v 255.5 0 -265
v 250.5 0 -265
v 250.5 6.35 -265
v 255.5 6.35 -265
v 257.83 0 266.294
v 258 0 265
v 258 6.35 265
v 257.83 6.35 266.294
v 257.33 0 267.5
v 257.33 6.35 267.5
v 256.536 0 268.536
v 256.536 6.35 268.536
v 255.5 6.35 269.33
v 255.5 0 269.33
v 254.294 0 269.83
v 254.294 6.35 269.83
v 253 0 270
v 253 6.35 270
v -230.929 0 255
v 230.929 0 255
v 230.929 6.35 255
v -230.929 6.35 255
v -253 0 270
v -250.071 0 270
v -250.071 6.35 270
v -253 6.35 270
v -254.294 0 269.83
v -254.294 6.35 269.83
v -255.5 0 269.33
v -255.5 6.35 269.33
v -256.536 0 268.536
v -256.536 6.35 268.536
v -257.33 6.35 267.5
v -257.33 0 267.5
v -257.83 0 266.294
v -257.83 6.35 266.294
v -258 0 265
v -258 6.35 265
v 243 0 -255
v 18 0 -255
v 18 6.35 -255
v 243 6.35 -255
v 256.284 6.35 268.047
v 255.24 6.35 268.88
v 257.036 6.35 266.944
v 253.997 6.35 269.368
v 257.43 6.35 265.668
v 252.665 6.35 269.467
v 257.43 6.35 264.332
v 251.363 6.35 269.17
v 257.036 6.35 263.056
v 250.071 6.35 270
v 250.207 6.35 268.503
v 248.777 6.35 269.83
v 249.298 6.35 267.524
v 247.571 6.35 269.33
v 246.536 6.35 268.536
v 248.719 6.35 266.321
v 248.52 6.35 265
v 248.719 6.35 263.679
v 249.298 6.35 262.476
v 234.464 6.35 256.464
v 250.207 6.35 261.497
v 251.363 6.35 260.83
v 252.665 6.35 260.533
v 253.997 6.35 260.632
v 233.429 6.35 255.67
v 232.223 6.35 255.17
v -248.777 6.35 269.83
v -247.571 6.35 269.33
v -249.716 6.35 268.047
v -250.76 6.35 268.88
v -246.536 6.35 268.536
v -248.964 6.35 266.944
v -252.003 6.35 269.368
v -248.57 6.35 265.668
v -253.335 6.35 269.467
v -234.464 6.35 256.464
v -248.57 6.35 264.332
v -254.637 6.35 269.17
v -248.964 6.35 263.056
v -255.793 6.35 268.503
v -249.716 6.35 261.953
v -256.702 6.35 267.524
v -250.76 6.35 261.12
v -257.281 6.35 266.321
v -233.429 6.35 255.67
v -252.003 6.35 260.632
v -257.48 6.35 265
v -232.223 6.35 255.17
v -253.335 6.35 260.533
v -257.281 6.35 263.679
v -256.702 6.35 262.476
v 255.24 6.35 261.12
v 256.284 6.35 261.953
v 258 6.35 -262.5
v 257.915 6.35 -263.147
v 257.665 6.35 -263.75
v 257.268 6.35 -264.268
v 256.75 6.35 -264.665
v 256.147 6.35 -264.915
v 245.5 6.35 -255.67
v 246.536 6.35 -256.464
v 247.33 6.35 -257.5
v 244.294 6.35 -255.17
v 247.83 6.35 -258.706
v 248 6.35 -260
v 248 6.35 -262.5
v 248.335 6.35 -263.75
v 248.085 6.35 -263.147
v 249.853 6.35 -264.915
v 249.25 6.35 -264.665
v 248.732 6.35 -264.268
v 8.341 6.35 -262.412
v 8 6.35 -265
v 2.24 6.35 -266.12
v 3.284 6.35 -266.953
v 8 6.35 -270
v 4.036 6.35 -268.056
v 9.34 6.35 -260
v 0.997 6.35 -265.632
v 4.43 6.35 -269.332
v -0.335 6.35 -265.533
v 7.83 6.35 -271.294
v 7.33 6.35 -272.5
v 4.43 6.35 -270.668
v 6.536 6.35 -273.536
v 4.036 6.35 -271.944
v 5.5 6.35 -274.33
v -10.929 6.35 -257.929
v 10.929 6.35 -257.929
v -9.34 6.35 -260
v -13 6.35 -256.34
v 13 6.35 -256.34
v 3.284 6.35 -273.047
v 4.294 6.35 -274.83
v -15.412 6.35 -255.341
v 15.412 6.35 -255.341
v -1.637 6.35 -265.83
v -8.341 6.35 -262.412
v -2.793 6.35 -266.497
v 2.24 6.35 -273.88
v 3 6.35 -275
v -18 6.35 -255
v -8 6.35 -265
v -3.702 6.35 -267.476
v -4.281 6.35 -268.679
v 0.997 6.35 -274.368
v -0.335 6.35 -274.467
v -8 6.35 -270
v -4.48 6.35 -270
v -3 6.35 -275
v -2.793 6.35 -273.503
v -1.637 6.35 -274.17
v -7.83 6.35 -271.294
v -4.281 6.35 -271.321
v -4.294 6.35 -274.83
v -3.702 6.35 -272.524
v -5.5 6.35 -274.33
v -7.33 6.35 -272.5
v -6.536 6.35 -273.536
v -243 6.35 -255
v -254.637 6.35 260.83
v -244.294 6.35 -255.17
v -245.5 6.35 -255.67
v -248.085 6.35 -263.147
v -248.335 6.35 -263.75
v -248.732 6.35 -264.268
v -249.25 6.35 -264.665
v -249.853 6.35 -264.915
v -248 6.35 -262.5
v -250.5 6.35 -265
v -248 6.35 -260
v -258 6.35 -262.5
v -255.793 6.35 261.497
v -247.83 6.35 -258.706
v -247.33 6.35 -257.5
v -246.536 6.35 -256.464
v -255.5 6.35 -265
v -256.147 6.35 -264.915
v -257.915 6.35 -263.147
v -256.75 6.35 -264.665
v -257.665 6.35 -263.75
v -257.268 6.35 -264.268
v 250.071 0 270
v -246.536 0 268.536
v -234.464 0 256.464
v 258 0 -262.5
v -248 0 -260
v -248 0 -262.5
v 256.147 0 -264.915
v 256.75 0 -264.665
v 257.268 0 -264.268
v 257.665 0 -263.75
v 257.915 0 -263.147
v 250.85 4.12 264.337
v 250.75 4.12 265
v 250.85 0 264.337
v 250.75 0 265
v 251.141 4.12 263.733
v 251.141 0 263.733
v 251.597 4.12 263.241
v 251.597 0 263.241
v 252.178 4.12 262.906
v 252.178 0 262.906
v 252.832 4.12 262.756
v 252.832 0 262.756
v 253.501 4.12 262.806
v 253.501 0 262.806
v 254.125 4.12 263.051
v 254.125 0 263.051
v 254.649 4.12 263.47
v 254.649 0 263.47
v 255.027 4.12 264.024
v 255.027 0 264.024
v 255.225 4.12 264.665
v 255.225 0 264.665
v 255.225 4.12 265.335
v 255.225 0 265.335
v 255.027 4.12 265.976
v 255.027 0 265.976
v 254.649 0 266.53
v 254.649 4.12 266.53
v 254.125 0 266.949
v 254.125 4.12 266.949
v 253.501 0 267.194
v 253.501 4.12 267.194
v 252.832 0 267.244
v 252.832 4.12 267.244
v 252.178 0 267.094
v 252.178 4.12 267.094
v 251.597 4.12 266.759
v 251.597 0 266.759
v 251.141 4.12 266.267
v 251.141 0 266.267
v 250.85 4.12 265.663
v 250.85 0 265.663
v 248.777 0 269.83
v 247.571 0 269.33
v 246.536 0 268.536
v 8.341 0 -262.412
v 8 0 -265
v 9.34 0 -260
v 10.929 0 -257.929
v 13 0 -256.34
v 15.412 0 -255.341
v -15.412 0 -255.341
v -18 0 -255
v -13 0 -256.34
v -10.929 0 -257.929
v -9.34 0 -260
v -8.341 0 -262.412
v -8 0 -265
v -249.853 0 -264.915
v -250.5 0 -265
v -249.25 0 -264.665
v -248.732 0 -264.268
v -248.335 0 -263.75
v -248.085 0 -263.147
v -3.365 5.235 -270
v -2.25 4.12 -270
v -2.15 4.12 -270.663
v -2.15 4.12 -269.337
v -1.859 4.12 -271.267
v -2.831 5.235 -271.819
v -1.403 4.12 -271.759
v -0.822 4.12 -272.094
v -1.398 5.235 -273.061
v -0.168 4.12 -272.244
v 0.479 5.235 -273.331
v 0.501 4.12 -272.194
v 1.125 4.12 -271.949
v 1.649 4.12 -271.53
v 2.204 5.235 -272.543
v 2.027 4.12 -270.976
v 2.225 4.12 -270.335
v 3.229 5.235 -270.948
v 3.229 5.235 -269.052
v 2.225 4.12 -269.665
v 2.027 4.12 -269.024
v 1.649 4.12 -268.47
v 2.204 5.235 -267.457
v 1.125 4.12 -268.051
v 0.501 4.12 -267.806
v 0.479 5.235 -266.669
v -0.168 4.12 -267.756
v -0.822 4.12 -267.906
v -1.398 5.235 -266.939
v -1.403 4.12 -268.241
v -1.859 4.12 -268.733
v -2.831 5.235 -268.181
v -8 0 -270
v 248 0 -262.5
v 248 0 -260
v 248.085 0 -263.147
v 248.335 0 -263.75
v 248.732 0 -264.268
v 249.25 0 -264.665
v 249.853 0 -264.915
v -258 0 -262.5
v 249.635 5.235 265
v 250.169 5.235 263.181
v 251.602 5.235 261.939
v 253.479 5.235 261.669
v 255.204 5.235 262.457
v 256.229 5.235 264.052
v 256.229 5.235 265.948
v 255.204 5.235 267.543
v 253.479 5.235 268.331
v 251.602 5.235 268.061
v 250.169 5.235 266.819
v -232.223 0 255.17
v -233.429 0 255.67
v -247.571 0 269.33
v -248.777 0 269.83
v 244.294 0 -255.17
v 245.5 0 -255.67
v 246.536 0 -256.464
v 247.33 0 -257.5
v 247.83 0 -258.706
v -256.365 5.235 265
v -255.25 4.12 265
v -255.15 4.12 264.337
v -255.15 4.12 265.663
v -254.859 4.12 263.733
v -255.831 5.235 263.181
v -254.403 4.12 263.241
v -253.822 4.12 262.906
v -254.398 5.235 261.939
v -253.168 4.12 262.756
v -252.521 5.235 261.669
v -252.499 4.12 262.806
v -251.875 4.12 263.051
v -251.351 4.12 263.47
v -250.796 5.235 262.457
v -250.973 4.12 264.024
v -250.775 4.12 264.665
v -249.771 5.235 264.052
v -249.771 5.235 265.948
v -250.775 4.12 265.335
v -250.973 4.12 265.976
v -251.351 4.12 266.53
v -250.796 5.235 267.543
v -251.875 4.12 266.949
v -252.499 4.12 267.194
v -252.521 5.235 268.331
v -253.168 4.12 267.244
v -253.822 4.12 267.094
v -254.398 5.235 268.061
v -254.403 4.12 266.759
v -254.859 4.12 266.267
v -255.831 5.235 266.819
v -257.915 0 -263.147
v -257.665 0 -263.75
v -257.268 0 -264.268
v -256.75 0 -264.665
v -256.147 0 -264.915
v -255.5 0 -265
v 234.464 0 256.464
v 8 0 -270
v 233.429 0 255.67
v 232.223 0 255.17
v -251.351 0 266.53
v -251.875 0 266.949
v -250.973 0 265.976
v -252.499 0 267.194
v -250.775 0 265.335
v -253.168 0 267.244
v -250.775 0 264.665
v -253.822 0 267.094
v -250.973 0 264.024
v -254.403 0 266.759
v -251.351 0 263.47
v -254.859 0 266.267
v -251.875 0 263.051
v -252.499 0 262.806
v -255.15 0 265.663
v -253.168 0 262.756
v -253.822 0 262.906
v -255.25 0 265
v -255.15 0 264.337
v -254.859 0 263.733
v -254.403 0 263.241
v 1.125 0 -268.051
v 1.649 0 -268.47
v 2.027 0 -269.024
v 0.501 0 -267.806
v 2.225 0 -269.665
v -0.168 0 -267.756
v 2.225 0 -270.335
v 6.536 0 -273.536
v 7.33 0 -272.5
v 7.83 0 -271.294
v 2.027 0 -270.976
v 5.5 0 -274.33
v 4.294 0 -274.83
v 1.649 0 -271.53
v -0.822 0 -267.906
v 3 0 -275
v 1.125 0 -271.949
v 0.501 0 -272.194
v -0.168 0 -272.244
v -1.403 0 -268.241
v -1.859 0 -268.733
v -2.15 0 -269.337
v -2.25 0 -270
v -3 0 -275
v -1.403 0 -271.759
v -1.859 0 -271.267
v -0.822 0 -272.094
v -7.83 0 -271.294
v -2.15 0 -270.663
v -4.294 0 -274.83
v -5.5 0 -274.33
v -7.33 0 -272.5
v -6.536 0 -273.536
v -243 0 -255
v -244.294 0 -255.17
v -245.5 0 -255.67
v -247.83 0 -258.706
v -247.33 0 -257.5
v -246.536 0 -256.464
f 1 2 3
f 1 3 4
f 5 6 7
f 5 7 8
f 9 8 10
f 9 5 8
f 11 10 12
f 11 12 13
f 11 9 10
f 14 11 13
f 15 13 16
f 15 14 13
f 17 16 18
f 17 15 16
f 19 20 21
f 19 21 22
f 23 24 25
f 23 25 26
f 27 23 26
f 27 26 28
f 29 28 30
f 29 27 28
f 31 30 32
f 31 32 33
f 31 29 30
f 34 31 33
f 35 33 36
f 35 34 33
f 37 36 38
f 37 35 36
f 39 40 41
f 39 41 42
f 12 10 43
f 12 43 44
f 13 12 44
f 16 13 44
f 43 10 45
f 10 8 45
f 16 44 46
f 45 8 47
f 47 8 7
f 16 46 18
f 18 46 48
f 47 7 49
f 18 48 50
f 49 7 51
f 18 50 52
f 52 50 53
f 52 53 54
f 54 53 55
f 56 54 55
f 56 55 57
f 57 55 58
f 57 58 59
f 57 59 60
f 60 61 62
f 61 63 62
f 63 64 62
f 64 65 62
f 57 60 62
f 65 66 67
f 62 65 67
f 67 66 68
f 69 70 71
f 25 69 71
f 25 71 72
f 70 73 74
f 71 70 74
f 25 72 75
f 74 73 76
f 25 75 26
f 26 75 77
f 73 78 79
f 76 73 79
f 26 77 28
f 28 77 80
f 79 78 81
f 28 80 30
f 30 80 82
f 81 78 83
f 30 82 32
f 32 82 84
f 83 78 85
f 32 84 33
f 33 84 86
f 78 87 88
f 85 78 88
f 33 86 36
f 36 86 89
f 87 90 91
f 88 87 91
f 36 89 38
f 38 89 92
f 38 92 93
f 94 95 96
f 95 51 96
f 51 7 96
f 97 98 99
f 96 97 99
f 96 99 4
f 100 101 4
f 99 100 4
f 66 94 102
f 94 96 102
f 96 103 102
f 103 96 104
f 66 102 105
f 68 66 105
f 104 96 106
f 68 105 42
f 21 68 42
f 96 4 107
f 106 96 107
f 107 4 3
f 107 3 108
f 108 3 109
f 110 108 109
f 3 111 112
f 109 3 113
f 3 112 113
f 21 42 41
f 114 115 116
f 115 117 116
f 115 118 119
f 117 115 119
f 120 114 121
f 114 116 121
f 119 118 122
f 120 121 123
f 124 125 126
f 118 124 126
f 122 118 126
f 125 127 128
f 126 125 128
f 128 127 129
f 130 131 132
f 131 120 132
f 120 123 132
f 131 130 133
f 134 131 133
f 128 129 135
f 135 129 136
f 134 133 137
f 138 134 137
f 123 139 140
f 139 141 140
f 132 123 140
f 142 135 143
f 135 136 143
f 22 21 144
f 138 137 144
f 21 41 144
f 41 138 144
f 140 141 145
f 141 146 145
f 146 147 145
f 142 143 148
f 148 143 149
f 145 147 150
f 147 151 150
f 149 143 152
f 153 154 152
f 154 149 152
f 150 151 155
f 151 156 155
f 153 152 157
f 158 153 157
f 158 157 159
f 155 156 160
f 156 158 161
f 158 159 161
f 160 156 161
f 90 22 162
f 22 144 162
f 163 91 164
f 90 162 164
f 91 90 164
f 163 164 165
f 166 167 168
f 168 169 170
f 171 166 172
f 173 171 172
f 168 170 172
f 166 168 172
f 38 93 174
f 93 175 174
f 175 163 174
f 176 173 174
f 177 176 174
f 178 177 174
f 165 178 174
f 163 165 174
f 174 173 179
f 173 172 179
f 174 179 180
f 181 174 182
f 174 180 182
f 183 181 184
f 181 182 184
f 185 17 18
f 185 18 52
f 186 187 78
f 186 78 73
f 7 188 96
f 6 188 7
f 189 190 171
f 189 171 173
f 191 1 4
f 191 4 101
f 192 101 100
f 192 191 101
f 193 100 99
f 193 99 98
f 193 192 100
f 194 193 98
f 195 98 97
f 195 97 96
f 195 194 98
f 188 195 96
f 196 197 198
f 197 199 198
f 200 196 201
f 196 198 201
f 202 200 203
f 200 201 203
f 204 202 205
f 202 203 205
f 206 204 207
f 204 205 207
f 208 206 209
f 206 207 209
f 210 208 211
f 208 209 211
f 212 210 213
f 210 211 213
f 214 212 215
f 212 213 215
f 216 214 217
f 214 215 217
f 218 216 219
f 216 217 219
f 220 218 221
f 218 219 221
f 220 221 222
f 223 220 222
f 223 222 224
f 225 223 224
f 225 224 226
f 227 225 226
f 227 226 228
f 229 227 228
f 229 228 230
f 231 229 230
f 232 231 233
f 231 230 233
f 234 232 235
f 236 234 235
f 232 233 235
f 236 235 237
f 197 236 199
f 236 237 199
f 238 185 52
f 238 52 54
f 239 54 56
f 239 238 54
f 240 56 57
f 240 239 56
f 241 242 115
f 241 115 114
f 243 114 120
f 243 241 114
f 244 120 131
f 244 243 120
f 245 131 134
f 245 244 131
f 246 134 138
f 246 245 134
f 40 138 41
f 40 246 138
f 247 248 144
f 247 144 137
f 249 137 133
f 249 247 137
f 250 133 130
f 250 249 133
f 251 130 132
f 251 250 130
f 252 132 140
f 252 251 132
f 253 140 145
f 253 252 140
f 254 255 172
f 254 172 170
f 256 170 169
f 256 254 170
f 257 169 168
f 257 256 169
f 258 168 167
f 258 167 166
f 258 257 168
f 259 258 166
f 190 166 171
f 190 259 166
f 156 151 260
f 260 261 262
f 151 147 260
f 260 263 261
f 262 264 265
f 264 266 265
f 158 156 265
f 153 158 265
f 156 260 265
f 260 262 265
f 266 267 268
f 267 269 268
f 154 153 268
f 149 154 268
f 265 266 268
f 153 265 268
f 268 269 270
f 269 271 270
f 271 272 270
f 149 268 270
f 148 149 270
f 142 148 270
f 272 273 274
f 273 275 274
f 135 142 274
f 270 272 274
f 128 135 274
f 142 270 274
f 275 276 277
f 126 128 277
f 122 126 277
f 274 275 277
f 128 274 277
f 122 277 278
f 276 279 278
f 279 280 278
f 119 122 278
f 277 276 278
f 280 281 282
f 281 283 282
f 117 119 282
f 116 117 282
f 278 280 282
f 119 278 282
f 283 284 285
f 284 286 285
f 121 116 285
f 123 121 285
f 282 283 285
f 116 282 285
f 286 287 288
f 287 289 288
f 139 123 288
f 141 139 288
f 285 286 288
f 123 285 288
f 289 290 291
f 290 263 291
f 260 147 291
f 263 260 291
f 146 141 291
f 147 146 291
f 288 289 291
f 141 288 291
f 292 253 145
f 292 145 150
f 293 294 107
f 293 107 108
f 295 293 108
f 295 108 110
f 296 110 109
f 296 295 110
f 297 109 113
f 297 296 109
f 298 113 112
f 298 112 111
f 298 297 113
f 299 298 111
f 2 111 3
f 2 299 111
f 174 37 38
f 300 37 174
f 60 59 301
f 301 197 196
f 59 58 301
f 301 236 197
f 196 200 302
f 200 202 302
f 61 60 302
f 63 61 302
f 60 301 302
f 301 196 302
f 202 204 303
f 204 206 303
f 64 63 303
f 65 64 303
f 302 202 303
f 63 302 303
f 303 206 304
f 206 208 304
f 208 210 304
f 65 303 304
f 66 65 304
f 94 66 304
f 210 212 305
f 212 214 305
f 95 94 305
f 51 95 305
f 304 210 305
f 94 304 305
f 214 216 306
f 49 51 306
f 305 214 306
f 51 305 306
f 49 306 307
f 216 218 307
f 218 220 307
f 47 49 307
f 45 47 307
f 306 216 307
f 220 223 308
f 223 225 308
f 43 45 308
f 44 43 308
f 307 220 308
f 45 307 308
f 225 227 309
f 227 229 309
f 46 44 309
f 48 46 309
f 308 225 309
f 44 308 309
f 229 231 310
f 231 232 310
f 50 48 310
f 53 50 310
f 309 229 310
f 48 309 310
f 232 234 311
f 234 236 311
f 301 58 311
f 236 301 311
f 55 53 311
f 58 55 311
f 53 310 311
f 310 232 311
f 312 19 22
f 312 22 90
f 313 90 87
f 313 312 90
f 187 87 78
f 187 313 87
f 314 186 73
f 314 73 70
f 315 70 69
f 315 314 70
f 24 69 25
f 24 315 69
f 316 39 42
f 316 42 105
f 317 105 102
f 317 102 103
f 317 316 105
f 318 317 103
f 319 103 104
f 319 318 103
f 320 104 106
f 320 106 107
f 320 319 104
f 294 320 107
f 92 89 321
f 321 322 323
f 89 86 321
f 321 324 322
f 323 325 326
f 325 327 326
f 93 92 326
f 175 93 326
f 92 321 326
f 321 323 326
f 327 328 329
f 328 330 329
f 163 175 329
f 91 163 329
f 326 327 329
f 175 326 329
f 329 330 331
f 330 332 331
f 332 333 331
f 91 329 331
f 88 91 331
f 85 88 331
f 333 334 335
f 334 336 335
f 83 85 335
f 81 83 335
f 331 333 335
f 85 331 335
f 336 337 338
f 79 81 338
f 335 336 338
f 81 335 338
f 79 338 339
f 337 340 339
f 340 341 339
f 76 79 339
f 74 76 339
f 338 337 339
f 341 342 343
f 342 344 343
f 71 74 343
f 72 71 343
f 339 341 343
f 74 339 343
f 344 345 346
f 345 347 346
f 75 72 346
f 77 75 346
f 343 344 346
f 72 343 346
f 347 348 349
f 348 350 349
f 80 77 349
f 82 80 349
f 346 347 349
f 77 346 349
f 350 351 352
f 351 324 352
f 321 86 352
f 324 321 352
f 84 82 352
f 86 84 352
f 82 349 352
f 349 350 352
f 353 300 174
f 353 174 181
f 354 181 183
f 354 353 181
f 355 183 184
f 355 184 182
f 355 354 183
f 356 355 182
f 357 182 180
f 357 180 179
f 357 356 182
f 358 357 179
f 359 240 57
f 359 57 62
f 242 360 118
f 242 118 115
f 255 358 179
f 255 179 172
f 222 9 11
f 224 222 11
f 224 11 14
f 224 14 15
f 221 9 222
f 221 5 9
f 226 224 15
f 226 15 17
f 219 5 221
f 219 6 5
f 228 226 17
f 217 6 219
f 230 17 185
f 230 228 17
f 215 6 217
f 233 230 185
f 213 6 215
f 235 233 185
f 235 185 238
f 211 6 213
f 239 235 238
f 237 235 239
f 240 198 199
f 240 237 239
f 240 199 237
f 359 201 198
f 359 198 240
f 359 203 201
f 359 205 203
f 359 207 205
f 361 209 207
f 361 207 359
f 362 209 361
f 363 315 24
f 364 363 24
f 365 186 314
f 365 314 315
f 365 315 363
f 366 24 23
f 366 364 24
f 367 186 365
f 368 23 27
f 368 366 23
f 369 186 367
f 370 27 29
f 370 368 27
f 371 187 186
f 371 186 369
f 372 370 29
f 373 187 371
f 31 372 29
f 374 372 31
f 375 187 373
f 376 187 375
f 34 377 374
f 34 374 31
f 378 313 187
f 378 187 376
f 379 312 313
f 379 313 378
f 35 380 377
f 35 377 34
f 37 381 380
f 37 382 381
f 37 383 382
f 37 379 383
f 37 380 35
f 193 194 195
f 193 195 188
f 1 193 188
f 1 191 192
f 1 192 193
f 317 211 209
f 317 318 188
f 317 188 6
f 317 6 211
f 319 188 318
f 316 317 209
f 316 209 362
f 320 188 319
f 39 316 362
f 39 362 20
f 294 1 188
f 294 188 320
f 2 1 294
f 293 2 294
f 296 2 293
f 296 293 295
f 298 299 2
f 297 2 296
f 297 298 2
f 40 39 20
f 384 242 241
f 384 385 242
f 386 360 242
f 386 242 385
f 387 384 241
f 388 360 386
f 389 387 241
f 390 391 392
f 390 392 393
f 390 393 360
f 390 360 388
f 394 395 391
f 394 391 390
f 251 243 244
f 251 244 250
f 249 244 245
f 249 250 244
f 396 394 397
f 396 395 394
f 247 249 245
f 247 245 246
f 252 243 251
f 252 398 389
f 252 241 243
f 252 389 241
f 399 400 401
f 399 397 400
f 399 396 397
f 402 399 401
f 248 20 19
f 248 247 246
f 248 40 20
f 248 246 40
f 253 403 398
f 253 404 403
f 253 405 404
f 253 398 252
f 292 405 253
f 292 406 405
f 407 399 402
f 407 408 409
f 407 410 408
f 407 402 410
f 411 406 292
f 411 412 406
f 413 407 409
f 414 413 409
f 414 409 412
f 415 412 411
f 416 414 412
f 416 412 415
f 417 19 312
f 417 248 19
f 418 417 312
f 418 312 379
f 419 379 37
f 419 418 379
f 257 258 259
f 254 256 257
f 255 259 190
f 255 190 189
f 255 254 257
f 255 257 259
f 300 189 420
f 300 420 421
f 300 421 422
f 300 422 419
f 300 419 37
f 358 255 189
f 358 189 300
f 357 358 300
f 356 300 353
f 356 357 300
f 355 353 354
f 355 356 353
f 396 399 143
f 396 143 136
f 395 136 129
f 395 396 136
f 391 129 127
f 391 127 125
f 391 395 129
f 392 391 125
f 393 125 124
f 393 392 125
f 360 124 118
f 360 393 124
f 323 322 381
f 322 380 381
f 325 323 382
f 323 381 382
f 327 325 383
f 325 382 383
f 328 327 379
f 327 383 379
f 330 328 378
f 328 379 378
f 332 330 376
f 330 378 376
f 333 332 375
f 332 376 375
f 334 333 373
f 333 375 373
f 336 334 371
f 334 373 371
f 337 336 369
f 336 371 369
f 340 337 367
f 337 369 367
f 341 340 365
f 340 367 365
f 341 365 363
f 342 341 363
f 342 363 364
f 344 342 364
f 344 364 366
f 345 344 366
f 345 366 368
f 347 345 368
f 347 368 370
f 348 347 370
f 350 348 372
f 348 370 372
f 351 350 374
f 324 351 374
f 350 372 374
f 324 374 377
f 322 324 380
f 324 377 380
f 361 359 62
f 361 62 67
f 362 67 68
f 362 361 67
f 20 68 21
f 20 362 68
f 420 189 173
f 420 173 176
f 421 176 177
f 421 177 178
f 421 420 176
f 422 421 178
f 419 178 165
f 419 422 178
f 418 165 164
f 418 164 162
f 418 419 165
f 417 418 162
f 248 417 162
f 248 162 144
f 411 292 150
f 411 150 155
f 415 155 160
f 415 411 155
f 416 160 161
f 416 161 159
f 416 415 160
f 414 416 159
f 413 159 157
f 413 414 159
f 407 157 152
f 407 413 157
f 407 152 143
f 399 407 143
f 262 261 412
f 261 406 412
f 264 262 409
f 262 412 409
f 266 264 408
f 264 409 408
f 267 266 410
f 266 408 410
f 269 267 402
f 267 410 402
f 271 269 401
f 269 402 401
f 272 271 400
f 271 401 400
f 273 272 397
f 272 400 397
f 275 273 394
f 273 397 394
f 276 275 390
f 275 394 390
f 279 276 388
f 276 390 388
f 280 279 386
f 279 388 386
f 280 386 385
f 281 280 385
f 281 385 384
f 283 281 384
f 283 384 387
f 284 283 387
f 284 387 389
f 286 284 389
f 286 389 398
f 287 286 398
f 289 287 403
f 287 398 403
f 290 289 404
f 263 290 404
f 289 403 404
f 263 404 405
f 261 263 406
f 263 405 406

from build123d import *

# Parameters (mm, degrees)
BOSS_EXTRUDE1_DEPTH           = 6.35
CSK_FOR_M4_SFHCS1_D           = 4.5
CSK_FOR_M4_SFHCS1_CSINK_D     = 8.96
CSK_FOR_M4_SFHCS1_CSINK_ANGLE = 90


with BuildPart() as part:
    # Sketch1 → Boss-Extrude1 (new body)
    with BuildSketch(Plane(origin=(0, 0, 0), x_dir=(1, 0, 0), z_dir=(0, 1, 0))):
        with BuildLine():
            Line((230.928932188, -255), (-230.928932188, -255))
            ThreePointArc((-230.928932188, -255), (-232.84234935, -255.380602337), (-234.464466094, -256.464466094))
            Line((-234.464466094, -256.464466094), (-246.535533906, -268.535533906))
            ThreePointArc((-246.535533906, -268.535533906), (-248.15765065, -269.619397663), (-250.071067812, -270))
            Line((-250.071067812, -270), (-253, -270))
            ThreePointArc((-253, -270), (-256.535533906, -268.535533906), (-258, -265))
            Line((-258, -265), (-258, 262.5))
            ThreePointArc((-258, 262.5), (-257.267766953, 264.267766953), (-255.5, 265))
            Line((-255.5, 265), (-250.5, 265))
            ThreePointArc((-250.5, 265), (-248.732233047, 264.267766953), (-248, 262.5))
            Line((-248, 262.5), (-248, 260))
            ThreePointArc((-248, 260), (-246.535533906, 256.464466094), (-243, 255))
            Line((-243, 255), (-18, 255))
            ThreePointArc((-18, 255), (-10.928932188, 257.928932188), (-8, 265))
            Line((-8, 265), (-8, 270))
            ThreePointArc((-8, 270), (-6.535533906, 273.535533906), (-3, 275))
            Line((-3, 275), (3, 275))
            ThreePointArc((3, 275), (6.535533906, 273.535533906), (8, 270))
            Line((8, 270), (8, 265))
            ThreePointArc((8, 265), (10.928932188, 257.928932188), (18, 255))
            Line((18, 255), (243, 255))
            ThreePointArc((243, 255), (246.535533906, 256.464466094), (248, 260))
            Line((248, 260), (248, 262.5))
            ThreePointArc((248, 262.5), (248.732233047, 264.267766953), (250.5, 265))
            Line((250.5, 265), (255.5, 265))
            ThreePointArc((255.5, 265), (257.267766953, 264.267766953), (258, 262.5))
            Line((258, 262.5), (258, -265))
            ThreePointArc((258, -265), (256.535533906, -268.535533906), (253, -270))
            Line((253, -270), (250.071067812, -270))
            ThreePointArc((250.071067812, -270), (248.15765065, -269.619397663), (246.535533906, -268.535533906))
            Line((246.535533906, -268.535533906), (234.464466094, -256.464466094))
            ThreePointArc((234.464466094, -256.464466094), (232.84234935, -255.380602337), (230.928932188, -255))
        make_face()
    extrude(amount=BOSS_EXTRUDE1_DEPTH)

    # CSK for M4 SFHCS1 (through all)
    with Locations(Plane(origin=(0, 6.35, 0), x_dir=(1, 0, 0), z_dir=(0, 1, 0))):
        with Locations((0, 270), (253, -265), (-253, -265)):
            CounterSinkHole(CSK_FOR_M4_SFHCS1_D / 2, CSK_FOR_M4_SFHCS1_CSINK_D / 2, counter_sink_angle=CSK_FOR_M4_SFHCS1_CSINK_ANGLE)


solid = part.part
